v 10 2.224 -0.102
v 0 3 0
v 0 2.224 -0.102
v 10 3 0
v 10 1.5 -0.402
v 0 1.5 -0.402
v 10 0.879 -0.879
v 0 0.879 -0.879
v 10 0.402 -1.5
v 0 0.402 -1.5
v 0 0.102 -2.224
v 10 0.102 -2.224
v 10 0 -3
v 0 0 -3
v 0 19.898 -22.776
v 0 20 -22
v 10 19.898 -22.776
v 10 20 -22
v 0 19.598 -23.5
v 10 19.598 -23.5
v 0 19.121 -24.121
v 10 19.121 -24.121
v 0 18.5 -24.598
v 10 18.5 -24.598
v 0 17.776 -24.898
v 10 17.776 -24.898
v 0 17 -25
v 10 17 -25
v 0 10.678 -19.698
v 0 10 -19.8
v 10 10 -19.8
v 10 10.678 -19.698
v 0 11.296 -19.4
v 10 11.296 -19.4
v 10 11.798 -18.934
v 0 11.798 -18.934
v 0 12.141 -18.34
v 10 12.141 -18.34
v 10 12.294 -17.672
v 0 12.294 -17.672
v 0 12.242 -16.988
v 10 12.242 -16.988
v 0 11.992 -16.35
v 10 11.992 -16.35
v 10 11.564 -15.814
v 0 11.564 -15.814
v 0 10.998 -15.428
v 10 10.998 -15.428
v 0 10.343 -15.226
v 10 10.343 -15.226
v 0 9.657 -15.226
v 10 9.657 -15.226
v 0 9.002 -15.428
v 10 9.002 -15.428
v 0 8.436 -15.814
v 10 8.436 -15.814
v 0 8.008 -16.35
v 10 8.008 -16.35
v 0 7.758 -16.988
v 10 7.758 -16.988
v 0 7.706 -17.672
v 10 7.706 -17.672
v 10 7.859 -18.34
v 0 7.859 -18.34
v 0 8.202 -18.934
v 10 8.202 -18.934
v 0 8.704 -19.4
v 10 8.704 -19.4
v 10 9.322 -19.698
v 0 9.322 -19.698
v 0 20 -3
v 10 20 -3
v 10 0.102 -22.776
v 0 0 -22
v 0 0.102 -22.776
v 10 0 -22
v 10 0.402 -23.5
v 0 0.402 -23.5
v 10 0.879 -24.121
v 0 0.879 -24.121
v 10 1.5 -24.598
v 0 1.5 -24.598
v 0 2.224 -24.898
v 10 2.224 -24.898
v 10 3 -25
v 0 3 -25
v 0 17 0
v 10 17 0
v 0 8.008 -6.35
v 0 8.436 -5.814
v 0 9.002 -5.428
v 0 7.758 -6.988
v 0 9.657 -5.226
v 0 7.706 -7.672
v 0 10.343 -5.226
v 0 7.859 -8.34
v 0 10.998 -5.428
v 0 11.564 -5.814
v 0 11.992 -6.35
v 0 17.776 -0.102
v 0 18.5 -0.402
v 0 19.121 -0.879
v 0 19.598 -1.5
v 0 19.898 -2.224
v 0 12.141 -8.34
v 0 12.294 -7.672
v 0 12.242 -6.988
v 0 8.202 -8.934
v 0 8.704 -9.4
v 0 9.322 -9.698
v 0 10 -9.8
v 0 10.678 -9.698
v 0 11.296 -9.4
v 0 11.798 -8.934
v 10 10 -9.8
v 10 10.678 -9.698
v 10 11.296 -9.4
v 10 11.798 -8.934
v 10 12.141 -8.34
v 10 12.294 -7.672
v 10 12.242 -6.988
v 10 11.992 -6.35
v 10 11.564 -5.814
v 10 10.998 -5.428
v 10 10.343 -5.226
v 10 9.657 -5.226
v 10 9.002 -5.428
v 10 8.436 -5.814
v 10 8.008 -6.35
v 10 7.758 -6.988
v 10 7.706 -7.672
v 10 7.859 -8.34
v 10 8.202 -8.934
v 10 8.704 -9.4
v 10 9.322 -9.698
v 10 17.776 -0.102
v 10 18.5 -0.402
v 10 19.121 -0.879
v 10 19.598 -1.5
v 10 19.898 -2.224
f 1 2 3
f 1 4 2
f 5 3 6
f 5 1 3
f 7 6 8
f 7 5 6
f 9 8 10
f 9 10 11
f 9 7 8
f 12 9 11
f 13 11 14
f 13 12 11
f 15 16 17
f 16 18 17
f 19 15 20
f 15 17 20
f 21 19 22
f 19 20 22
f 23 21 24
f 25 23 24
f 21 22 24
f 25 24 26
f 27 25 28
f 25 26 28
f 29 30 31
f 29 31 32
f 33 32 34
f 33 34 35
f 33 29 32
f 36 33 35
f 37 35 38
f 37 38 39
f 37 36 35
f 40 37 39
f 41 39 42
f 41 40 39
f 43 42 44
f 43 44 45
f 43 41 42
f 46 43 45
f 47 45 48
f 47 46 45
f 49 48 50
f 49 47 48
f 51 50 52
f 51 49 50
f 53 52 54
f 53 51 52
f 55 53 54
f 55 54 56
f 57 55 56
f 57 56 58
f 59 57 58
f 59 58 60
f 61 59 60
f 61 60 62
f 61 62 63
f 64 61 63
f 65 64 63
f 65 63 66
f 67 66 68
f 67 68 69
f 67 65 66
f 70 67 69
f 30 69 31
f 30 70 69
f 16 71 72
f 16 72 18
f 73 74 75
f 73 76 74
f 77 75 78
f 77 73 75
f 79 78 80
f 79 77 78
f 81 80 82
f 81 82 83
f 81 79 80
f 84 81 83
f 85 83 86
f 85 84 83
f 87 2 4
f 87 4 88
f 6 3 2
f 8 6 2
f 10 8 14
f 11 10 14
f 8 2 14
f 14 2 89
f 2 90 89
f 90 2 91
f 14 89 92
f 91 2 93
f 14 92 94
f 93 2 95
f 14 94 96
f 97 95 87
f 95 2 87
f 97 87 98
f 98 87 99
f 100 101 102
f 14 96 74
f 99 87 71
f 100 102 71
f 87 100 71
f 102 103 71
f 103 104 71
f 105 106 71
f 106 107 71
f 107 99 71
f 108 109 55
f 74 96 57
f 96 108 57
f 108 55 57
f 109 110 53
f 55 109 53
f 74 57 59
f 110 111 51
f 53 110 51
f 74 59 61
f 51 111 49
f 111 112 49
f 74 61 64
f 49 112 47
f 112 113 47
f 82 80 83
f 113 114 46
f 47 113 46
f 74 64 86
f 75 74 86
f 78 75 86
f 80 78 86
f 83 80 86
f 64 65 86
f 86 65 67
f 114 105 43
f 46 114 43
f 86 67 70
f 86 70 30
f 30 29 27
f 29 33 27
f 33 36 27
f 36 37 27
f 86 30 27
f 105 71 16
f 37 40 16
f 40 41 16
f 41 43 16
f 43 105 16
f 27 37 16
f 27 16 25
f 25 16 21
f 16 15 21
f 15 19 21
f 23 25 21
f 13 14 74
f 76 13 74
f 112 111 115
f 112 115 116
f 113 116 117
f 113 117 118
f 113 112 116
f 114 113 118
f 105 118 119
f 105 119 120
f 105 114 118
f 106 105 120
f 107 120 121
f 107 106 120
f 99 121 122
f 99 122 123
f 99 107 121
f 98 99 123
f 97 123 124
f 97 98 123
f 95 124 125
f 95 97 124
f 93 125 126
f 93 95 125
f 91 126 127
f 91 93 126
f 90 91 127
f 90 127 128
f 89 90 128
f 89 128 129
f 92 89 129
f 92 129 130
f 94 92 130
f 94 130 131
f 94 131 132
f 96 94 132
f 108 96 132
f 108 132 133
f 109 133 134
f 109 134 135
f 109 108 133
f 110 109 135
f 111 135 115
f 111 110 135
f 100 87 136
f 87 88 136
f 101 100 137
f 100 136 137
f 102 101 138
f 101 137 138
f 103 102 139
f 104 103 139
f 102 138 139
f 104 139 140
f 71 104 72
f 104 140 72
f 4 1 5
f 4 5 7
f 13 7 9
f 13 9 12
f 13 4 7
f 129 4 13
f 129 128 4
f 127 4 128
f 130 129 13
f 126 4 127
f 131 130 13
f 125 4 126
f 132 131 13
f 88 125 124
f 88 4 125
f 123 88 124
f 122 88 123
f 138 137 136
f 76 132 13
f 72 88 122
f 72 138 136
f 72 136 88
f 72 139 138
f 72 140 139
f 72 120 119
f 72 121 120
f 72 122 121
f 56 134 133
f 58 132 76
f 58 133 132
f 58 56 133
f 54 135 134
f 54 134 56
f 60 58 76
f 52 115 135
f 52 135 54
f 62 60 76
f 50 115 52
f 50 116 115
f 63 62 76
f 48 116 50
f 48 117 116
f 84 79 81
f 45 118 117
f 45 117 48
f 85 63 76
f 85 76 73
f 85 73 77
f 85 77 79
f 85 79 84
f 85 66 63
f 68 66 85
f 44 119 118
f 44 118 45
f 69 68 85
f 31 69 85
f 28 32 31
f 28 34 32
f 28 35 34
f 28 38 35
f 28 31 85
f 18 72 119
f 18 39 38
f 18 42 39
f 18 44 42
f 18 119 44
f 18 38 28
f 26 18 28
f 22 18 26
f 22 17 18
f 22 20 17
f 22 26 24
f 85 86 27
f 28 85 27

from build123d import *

# Parameters (mm, degrees)
SKETCH_1_W      = 25
SKETCH_1_H      = 20
SKETCH_1_R      = 2.3
EXTRUDE_1_DEPTH = 10
FILLET_1_R      = 3


with BuildPart() as part:
    # 草图1 → 凸台-拉伸1 (new body)
    with BuildSketch(Plane(origin=(0, 0, 0), x_dir=(0, 0, -1), z_dir=(1, 0, 0))):
        with Locations((12.5, 10)):
            Rectangle(SKETCH_1_W, SKETCH_1_H)
        with Locations((7.5, 10)):
            Circle(SKETCH_1_R, mode=Mode.SUBTRACT)
        with Locations((17.5, 10)):
            Circle(SKETCH_1_R, mode=Mode.SUBTRACT)
    extrude(amount=EXTRUDE_1_DEPTH)

    # 圆角1
    fillet_1_edges = [part.edges().sort_by_distance(p)[0] for p in [
        (5, 20, 0),
        (5, 20, -25),
        (5, 0, -25),
        (5, 0, 0),
    ]]
    fillet(fillet_1_edges, radius=FILLET_1_R)


solid = part.part
